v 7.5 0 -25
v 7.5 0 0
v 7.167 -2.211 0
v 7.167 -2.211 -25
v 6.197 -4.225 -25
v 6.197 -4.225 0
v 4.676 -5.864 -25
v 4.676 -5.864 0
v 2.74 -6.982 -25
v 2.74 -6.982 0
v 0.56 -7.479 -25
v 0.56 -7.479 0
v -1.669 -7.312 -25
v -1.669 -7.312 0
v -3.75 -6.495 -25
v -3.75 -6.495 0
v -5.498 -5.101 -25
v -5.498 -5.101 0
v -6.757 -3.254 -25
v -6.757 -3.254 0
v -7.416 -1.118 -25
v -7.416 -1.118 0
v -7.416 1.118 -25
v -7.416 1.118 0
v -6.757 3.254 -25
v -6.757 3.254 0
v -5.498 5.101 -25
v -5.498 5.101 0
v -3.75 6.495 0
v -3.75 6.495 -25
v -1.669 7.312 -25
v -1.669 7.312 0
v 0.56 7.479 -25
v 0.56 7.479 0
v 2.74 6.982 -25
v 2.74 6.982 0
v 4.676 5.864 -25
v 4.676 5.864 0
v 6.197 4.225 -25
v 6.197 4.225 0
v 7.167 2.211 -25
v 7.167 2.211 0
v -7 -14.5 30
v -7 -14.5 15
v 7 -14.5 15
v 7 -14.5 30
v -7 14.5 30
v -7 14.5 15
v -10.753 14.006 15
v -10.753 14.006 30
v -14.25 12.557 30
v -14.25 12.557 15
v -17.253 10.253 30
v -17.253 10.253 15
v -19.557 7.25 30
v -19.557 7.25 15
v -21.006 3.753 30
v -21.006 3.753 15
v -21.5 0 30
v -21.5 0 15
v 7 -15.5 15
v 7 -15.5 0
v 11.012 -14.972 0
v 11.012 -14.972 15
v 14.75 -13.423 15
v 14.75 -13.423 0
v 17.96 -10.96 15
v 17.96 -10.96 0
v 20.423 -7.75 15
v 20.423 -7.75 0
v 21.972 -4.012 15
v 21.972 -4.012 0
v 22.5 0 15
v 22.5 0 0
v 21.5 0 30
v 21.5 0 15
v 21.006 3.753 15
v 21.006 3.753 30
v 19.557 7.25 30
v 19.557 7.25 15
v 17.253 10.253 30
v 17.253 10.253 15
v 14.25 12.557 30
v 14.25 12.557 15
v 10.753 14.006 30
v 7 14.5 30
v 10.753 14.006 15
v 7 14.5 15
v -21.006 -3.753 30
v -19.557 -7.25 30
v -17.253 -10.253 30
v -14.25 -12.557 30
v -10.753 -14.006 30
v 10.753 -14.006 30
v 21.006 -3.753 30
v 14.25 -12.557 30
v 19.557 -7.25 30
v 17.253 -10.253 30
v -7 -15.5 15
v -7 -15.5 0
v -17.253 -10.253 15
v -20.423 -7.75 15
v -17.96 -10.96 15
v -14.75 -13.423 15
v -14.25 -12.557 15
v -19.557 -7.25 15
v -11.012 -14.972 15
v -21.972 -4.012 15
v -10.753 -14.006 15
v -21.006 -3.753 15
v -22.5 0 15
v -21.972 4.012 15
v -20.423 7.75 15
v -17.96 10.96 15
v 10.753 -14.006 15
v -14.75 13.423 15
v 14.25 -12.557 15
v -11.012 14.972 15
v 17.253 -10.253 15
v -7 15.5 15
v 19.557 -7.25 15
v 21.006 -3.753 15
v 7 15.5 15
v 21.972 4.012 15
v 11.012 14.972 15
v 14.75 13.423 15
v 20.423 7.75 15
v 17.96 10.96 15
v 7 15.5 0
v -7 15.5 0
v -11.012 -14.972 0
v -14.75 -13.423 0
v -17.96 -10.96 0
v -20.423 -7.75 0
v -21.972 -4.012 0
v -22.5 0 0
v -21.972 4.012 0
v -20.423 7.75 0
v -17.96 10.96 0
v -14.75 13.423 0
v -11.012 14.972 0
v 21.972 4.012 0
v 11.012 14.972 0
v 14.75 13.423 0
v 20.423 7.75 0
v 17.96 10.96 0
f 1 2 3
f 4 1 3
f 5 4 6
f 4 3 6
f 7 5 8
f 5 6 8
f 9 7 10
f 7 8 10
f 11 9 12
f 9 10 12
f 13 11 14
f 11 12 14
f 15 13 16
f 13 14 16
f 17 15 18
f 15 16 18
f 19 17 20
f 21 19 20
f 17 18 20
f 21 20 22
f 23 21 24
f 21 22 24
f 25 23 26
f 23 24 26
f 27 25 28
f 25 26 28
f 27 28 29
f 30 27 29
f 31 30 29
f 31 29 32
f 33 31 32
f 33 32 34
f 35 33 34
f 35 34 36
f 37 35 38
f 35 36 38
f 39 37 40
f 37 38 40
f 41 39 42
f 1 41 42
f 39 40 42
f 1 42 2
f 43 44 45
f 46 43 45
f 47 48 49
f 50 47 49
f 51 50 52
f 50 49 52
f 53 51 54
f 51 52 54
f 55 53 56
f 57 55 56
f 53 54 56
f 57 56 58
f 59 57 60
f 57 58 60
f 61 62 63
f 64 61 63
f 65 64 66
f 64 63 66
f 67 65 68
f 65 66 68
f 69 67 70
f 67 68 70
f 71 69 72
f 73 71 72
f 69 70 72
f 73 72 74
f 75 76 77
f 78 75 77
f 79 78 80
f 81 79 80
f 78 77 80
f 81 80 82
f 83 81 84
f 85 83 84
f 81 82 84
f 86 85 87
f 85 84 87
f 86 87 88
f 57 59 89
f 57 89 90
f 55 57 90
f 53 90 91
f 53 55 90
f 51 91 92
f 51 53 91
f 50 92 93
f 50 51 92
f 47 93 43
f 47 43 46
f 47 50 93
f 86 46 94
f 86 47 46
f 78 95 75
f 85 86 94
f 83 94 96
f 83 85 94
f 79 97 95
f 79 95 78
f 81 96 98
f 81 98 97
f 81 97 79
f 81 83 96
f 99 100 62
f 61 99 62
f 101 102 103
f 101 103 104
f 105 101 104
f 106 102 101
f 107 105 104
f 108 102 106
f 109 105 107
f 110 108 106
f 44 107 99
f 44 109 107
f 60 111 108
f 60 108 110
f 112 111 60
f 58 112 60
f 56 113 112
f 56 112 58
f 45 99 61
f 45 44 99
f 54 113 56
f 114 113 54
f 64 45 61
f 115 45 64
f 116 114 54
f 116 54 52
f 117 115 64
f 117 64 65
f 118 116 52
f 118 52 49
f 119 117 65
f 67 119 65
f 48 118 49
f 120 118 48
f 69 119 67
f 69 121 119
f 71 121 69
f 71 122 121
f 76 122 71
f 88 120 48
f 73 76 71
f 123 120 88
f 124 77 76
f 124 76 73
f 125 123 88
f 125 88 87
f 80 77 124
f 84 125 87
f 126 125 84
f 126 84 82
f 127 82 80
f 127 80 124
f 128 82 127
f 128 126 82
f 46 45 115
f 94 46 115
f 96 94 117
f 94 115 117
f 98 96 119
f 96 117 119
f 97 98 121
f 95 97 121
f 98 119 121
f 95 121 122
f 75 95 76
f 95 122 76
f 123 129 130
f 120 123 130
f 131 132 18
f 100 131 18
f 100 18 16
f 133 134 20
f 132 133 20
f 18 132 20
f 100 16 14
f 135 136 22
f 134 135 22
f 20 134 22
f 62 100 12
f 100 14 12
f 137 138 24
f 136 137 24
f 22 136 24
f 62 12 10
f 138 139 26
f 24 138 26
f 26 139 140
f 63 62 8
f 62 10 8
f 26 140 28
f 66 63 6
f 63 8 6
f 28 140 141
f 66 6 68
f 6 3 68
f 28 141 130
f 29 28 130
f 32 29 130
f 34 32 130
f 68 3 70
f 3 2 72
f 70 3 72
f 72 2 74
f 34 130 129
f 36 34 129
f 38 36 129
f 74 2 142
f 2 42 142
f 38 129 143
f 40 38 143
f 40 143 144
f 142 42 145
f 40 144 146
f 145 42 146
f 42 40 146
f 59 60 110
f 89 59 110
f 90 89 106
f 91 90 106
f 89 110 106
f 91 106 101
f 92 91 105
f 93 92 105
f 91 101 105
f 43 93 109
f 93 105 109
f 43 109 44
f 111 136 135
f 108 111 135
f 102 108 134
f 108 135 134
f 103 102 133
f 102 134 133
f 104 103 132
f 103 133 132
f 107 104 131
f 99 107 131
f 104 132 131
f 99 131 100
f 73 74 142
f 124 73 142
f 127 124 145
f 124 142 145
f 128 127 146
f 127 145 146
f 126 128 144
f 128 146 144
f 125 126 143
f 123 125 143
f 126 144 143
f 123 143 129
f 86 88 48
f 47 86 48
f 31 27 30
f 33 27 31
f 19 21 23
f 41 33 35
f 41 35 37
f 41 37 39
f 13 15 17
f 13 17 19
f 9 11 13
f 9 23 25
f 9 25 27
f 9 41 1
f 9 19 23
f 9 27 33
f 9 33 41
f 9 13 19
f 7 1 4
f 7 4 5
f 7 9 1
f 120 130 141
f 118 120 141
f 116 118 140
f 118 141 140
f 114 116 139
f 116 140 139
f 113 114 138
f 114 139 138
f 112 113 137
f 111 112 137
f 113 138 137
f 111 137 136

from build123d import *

# Parameters (mm, degrees)
F1_DEPTH = 15
F3_DEPTH = 15
F4_R     = 7.5
F5_DEPTH = 25


with BuildPart() as f1:
    # F0 (on Top) → F1 (new body)
    with BuildSketch(Plane.XY):
        with BuildLine():
            ThreePointArc((22.5, 0), (17.960155, 10.960155), (7, 15.5))
            Line((7, 15.5), (-7, 15.5))
            ThreePointArc((-7, 15.5), (-17.960155, 10.960155), (-22.5, 0))
            Line((-22.5, 0), (-7, 0))
            Line((-7, 0), (0, 0))
            Line((0, 0), (7, 0))
            Line((7, 0), (22.5, 0))
        make_face()
        with BuildLine():
            ThreePointArc((7, -15.5), (17.960155, -10.960155), (22.5, 0))
            Line((22.5, 0), (7, 0))
            Line((7, 0), (0, 0))
            Line((0, 0), (-7, 0))
            Line((-7, 0), (-22.5, 0))
            ThreePointArc((-22.5, 0), (-17.960155, -10.960155), (-7, -15.5))
            Line((-7, -15.5), (7, -15.5))
        make_face()
    extrude(amount=F1_DEPTH)

    # F2 (on face) → F3 (join)
    with BuildSketch(Plane.XY.offset(15)):
        with BuildLine():
            ThreePointArc((21.5, 0), (17.253048, 10.253048), (7, 14.5))
            Line((7, 14.5), (-7, 14.5))
            ThreePointArc((-7, 14.5), (-17.253048, 10.253048), (-21.5, 0))
            Line((-21.5, 0), (-7, 0))
            Line((-7, 0), (0, 0))
            Line((0, 0), (7, 0))
            Line((7, 0), (21.5, 0))
        make_face()
        with BuildLine():
            ThreePointArc((7, -14.5), (17.253048, -10.253048), (21.5, 0))
            Line((21.5, 0), (7, 0))
            Line((7, 0), (0, 0))
            Line((0, 0), (-7, 0))
            Line((-7, 0), (-21.5, 0))
            ThreePointArc((-21.5, 0), (-17.253048, -10.253048), (-7, -14.5))
            Line((-7, -14.5), (7, -14.5))
        make_face()
    extrude(amount=F3_DEPTH)

    # F4 (on face) → F5 (join)
    with BuildSketch(Plane(origin=(0, 0, 0), x_dir=(1, 0, 0), z_dir=(0, 0, -1))):
        Circle(F4_R)
    extrude(amount=F5_DEPTH)


solid = f1.part
